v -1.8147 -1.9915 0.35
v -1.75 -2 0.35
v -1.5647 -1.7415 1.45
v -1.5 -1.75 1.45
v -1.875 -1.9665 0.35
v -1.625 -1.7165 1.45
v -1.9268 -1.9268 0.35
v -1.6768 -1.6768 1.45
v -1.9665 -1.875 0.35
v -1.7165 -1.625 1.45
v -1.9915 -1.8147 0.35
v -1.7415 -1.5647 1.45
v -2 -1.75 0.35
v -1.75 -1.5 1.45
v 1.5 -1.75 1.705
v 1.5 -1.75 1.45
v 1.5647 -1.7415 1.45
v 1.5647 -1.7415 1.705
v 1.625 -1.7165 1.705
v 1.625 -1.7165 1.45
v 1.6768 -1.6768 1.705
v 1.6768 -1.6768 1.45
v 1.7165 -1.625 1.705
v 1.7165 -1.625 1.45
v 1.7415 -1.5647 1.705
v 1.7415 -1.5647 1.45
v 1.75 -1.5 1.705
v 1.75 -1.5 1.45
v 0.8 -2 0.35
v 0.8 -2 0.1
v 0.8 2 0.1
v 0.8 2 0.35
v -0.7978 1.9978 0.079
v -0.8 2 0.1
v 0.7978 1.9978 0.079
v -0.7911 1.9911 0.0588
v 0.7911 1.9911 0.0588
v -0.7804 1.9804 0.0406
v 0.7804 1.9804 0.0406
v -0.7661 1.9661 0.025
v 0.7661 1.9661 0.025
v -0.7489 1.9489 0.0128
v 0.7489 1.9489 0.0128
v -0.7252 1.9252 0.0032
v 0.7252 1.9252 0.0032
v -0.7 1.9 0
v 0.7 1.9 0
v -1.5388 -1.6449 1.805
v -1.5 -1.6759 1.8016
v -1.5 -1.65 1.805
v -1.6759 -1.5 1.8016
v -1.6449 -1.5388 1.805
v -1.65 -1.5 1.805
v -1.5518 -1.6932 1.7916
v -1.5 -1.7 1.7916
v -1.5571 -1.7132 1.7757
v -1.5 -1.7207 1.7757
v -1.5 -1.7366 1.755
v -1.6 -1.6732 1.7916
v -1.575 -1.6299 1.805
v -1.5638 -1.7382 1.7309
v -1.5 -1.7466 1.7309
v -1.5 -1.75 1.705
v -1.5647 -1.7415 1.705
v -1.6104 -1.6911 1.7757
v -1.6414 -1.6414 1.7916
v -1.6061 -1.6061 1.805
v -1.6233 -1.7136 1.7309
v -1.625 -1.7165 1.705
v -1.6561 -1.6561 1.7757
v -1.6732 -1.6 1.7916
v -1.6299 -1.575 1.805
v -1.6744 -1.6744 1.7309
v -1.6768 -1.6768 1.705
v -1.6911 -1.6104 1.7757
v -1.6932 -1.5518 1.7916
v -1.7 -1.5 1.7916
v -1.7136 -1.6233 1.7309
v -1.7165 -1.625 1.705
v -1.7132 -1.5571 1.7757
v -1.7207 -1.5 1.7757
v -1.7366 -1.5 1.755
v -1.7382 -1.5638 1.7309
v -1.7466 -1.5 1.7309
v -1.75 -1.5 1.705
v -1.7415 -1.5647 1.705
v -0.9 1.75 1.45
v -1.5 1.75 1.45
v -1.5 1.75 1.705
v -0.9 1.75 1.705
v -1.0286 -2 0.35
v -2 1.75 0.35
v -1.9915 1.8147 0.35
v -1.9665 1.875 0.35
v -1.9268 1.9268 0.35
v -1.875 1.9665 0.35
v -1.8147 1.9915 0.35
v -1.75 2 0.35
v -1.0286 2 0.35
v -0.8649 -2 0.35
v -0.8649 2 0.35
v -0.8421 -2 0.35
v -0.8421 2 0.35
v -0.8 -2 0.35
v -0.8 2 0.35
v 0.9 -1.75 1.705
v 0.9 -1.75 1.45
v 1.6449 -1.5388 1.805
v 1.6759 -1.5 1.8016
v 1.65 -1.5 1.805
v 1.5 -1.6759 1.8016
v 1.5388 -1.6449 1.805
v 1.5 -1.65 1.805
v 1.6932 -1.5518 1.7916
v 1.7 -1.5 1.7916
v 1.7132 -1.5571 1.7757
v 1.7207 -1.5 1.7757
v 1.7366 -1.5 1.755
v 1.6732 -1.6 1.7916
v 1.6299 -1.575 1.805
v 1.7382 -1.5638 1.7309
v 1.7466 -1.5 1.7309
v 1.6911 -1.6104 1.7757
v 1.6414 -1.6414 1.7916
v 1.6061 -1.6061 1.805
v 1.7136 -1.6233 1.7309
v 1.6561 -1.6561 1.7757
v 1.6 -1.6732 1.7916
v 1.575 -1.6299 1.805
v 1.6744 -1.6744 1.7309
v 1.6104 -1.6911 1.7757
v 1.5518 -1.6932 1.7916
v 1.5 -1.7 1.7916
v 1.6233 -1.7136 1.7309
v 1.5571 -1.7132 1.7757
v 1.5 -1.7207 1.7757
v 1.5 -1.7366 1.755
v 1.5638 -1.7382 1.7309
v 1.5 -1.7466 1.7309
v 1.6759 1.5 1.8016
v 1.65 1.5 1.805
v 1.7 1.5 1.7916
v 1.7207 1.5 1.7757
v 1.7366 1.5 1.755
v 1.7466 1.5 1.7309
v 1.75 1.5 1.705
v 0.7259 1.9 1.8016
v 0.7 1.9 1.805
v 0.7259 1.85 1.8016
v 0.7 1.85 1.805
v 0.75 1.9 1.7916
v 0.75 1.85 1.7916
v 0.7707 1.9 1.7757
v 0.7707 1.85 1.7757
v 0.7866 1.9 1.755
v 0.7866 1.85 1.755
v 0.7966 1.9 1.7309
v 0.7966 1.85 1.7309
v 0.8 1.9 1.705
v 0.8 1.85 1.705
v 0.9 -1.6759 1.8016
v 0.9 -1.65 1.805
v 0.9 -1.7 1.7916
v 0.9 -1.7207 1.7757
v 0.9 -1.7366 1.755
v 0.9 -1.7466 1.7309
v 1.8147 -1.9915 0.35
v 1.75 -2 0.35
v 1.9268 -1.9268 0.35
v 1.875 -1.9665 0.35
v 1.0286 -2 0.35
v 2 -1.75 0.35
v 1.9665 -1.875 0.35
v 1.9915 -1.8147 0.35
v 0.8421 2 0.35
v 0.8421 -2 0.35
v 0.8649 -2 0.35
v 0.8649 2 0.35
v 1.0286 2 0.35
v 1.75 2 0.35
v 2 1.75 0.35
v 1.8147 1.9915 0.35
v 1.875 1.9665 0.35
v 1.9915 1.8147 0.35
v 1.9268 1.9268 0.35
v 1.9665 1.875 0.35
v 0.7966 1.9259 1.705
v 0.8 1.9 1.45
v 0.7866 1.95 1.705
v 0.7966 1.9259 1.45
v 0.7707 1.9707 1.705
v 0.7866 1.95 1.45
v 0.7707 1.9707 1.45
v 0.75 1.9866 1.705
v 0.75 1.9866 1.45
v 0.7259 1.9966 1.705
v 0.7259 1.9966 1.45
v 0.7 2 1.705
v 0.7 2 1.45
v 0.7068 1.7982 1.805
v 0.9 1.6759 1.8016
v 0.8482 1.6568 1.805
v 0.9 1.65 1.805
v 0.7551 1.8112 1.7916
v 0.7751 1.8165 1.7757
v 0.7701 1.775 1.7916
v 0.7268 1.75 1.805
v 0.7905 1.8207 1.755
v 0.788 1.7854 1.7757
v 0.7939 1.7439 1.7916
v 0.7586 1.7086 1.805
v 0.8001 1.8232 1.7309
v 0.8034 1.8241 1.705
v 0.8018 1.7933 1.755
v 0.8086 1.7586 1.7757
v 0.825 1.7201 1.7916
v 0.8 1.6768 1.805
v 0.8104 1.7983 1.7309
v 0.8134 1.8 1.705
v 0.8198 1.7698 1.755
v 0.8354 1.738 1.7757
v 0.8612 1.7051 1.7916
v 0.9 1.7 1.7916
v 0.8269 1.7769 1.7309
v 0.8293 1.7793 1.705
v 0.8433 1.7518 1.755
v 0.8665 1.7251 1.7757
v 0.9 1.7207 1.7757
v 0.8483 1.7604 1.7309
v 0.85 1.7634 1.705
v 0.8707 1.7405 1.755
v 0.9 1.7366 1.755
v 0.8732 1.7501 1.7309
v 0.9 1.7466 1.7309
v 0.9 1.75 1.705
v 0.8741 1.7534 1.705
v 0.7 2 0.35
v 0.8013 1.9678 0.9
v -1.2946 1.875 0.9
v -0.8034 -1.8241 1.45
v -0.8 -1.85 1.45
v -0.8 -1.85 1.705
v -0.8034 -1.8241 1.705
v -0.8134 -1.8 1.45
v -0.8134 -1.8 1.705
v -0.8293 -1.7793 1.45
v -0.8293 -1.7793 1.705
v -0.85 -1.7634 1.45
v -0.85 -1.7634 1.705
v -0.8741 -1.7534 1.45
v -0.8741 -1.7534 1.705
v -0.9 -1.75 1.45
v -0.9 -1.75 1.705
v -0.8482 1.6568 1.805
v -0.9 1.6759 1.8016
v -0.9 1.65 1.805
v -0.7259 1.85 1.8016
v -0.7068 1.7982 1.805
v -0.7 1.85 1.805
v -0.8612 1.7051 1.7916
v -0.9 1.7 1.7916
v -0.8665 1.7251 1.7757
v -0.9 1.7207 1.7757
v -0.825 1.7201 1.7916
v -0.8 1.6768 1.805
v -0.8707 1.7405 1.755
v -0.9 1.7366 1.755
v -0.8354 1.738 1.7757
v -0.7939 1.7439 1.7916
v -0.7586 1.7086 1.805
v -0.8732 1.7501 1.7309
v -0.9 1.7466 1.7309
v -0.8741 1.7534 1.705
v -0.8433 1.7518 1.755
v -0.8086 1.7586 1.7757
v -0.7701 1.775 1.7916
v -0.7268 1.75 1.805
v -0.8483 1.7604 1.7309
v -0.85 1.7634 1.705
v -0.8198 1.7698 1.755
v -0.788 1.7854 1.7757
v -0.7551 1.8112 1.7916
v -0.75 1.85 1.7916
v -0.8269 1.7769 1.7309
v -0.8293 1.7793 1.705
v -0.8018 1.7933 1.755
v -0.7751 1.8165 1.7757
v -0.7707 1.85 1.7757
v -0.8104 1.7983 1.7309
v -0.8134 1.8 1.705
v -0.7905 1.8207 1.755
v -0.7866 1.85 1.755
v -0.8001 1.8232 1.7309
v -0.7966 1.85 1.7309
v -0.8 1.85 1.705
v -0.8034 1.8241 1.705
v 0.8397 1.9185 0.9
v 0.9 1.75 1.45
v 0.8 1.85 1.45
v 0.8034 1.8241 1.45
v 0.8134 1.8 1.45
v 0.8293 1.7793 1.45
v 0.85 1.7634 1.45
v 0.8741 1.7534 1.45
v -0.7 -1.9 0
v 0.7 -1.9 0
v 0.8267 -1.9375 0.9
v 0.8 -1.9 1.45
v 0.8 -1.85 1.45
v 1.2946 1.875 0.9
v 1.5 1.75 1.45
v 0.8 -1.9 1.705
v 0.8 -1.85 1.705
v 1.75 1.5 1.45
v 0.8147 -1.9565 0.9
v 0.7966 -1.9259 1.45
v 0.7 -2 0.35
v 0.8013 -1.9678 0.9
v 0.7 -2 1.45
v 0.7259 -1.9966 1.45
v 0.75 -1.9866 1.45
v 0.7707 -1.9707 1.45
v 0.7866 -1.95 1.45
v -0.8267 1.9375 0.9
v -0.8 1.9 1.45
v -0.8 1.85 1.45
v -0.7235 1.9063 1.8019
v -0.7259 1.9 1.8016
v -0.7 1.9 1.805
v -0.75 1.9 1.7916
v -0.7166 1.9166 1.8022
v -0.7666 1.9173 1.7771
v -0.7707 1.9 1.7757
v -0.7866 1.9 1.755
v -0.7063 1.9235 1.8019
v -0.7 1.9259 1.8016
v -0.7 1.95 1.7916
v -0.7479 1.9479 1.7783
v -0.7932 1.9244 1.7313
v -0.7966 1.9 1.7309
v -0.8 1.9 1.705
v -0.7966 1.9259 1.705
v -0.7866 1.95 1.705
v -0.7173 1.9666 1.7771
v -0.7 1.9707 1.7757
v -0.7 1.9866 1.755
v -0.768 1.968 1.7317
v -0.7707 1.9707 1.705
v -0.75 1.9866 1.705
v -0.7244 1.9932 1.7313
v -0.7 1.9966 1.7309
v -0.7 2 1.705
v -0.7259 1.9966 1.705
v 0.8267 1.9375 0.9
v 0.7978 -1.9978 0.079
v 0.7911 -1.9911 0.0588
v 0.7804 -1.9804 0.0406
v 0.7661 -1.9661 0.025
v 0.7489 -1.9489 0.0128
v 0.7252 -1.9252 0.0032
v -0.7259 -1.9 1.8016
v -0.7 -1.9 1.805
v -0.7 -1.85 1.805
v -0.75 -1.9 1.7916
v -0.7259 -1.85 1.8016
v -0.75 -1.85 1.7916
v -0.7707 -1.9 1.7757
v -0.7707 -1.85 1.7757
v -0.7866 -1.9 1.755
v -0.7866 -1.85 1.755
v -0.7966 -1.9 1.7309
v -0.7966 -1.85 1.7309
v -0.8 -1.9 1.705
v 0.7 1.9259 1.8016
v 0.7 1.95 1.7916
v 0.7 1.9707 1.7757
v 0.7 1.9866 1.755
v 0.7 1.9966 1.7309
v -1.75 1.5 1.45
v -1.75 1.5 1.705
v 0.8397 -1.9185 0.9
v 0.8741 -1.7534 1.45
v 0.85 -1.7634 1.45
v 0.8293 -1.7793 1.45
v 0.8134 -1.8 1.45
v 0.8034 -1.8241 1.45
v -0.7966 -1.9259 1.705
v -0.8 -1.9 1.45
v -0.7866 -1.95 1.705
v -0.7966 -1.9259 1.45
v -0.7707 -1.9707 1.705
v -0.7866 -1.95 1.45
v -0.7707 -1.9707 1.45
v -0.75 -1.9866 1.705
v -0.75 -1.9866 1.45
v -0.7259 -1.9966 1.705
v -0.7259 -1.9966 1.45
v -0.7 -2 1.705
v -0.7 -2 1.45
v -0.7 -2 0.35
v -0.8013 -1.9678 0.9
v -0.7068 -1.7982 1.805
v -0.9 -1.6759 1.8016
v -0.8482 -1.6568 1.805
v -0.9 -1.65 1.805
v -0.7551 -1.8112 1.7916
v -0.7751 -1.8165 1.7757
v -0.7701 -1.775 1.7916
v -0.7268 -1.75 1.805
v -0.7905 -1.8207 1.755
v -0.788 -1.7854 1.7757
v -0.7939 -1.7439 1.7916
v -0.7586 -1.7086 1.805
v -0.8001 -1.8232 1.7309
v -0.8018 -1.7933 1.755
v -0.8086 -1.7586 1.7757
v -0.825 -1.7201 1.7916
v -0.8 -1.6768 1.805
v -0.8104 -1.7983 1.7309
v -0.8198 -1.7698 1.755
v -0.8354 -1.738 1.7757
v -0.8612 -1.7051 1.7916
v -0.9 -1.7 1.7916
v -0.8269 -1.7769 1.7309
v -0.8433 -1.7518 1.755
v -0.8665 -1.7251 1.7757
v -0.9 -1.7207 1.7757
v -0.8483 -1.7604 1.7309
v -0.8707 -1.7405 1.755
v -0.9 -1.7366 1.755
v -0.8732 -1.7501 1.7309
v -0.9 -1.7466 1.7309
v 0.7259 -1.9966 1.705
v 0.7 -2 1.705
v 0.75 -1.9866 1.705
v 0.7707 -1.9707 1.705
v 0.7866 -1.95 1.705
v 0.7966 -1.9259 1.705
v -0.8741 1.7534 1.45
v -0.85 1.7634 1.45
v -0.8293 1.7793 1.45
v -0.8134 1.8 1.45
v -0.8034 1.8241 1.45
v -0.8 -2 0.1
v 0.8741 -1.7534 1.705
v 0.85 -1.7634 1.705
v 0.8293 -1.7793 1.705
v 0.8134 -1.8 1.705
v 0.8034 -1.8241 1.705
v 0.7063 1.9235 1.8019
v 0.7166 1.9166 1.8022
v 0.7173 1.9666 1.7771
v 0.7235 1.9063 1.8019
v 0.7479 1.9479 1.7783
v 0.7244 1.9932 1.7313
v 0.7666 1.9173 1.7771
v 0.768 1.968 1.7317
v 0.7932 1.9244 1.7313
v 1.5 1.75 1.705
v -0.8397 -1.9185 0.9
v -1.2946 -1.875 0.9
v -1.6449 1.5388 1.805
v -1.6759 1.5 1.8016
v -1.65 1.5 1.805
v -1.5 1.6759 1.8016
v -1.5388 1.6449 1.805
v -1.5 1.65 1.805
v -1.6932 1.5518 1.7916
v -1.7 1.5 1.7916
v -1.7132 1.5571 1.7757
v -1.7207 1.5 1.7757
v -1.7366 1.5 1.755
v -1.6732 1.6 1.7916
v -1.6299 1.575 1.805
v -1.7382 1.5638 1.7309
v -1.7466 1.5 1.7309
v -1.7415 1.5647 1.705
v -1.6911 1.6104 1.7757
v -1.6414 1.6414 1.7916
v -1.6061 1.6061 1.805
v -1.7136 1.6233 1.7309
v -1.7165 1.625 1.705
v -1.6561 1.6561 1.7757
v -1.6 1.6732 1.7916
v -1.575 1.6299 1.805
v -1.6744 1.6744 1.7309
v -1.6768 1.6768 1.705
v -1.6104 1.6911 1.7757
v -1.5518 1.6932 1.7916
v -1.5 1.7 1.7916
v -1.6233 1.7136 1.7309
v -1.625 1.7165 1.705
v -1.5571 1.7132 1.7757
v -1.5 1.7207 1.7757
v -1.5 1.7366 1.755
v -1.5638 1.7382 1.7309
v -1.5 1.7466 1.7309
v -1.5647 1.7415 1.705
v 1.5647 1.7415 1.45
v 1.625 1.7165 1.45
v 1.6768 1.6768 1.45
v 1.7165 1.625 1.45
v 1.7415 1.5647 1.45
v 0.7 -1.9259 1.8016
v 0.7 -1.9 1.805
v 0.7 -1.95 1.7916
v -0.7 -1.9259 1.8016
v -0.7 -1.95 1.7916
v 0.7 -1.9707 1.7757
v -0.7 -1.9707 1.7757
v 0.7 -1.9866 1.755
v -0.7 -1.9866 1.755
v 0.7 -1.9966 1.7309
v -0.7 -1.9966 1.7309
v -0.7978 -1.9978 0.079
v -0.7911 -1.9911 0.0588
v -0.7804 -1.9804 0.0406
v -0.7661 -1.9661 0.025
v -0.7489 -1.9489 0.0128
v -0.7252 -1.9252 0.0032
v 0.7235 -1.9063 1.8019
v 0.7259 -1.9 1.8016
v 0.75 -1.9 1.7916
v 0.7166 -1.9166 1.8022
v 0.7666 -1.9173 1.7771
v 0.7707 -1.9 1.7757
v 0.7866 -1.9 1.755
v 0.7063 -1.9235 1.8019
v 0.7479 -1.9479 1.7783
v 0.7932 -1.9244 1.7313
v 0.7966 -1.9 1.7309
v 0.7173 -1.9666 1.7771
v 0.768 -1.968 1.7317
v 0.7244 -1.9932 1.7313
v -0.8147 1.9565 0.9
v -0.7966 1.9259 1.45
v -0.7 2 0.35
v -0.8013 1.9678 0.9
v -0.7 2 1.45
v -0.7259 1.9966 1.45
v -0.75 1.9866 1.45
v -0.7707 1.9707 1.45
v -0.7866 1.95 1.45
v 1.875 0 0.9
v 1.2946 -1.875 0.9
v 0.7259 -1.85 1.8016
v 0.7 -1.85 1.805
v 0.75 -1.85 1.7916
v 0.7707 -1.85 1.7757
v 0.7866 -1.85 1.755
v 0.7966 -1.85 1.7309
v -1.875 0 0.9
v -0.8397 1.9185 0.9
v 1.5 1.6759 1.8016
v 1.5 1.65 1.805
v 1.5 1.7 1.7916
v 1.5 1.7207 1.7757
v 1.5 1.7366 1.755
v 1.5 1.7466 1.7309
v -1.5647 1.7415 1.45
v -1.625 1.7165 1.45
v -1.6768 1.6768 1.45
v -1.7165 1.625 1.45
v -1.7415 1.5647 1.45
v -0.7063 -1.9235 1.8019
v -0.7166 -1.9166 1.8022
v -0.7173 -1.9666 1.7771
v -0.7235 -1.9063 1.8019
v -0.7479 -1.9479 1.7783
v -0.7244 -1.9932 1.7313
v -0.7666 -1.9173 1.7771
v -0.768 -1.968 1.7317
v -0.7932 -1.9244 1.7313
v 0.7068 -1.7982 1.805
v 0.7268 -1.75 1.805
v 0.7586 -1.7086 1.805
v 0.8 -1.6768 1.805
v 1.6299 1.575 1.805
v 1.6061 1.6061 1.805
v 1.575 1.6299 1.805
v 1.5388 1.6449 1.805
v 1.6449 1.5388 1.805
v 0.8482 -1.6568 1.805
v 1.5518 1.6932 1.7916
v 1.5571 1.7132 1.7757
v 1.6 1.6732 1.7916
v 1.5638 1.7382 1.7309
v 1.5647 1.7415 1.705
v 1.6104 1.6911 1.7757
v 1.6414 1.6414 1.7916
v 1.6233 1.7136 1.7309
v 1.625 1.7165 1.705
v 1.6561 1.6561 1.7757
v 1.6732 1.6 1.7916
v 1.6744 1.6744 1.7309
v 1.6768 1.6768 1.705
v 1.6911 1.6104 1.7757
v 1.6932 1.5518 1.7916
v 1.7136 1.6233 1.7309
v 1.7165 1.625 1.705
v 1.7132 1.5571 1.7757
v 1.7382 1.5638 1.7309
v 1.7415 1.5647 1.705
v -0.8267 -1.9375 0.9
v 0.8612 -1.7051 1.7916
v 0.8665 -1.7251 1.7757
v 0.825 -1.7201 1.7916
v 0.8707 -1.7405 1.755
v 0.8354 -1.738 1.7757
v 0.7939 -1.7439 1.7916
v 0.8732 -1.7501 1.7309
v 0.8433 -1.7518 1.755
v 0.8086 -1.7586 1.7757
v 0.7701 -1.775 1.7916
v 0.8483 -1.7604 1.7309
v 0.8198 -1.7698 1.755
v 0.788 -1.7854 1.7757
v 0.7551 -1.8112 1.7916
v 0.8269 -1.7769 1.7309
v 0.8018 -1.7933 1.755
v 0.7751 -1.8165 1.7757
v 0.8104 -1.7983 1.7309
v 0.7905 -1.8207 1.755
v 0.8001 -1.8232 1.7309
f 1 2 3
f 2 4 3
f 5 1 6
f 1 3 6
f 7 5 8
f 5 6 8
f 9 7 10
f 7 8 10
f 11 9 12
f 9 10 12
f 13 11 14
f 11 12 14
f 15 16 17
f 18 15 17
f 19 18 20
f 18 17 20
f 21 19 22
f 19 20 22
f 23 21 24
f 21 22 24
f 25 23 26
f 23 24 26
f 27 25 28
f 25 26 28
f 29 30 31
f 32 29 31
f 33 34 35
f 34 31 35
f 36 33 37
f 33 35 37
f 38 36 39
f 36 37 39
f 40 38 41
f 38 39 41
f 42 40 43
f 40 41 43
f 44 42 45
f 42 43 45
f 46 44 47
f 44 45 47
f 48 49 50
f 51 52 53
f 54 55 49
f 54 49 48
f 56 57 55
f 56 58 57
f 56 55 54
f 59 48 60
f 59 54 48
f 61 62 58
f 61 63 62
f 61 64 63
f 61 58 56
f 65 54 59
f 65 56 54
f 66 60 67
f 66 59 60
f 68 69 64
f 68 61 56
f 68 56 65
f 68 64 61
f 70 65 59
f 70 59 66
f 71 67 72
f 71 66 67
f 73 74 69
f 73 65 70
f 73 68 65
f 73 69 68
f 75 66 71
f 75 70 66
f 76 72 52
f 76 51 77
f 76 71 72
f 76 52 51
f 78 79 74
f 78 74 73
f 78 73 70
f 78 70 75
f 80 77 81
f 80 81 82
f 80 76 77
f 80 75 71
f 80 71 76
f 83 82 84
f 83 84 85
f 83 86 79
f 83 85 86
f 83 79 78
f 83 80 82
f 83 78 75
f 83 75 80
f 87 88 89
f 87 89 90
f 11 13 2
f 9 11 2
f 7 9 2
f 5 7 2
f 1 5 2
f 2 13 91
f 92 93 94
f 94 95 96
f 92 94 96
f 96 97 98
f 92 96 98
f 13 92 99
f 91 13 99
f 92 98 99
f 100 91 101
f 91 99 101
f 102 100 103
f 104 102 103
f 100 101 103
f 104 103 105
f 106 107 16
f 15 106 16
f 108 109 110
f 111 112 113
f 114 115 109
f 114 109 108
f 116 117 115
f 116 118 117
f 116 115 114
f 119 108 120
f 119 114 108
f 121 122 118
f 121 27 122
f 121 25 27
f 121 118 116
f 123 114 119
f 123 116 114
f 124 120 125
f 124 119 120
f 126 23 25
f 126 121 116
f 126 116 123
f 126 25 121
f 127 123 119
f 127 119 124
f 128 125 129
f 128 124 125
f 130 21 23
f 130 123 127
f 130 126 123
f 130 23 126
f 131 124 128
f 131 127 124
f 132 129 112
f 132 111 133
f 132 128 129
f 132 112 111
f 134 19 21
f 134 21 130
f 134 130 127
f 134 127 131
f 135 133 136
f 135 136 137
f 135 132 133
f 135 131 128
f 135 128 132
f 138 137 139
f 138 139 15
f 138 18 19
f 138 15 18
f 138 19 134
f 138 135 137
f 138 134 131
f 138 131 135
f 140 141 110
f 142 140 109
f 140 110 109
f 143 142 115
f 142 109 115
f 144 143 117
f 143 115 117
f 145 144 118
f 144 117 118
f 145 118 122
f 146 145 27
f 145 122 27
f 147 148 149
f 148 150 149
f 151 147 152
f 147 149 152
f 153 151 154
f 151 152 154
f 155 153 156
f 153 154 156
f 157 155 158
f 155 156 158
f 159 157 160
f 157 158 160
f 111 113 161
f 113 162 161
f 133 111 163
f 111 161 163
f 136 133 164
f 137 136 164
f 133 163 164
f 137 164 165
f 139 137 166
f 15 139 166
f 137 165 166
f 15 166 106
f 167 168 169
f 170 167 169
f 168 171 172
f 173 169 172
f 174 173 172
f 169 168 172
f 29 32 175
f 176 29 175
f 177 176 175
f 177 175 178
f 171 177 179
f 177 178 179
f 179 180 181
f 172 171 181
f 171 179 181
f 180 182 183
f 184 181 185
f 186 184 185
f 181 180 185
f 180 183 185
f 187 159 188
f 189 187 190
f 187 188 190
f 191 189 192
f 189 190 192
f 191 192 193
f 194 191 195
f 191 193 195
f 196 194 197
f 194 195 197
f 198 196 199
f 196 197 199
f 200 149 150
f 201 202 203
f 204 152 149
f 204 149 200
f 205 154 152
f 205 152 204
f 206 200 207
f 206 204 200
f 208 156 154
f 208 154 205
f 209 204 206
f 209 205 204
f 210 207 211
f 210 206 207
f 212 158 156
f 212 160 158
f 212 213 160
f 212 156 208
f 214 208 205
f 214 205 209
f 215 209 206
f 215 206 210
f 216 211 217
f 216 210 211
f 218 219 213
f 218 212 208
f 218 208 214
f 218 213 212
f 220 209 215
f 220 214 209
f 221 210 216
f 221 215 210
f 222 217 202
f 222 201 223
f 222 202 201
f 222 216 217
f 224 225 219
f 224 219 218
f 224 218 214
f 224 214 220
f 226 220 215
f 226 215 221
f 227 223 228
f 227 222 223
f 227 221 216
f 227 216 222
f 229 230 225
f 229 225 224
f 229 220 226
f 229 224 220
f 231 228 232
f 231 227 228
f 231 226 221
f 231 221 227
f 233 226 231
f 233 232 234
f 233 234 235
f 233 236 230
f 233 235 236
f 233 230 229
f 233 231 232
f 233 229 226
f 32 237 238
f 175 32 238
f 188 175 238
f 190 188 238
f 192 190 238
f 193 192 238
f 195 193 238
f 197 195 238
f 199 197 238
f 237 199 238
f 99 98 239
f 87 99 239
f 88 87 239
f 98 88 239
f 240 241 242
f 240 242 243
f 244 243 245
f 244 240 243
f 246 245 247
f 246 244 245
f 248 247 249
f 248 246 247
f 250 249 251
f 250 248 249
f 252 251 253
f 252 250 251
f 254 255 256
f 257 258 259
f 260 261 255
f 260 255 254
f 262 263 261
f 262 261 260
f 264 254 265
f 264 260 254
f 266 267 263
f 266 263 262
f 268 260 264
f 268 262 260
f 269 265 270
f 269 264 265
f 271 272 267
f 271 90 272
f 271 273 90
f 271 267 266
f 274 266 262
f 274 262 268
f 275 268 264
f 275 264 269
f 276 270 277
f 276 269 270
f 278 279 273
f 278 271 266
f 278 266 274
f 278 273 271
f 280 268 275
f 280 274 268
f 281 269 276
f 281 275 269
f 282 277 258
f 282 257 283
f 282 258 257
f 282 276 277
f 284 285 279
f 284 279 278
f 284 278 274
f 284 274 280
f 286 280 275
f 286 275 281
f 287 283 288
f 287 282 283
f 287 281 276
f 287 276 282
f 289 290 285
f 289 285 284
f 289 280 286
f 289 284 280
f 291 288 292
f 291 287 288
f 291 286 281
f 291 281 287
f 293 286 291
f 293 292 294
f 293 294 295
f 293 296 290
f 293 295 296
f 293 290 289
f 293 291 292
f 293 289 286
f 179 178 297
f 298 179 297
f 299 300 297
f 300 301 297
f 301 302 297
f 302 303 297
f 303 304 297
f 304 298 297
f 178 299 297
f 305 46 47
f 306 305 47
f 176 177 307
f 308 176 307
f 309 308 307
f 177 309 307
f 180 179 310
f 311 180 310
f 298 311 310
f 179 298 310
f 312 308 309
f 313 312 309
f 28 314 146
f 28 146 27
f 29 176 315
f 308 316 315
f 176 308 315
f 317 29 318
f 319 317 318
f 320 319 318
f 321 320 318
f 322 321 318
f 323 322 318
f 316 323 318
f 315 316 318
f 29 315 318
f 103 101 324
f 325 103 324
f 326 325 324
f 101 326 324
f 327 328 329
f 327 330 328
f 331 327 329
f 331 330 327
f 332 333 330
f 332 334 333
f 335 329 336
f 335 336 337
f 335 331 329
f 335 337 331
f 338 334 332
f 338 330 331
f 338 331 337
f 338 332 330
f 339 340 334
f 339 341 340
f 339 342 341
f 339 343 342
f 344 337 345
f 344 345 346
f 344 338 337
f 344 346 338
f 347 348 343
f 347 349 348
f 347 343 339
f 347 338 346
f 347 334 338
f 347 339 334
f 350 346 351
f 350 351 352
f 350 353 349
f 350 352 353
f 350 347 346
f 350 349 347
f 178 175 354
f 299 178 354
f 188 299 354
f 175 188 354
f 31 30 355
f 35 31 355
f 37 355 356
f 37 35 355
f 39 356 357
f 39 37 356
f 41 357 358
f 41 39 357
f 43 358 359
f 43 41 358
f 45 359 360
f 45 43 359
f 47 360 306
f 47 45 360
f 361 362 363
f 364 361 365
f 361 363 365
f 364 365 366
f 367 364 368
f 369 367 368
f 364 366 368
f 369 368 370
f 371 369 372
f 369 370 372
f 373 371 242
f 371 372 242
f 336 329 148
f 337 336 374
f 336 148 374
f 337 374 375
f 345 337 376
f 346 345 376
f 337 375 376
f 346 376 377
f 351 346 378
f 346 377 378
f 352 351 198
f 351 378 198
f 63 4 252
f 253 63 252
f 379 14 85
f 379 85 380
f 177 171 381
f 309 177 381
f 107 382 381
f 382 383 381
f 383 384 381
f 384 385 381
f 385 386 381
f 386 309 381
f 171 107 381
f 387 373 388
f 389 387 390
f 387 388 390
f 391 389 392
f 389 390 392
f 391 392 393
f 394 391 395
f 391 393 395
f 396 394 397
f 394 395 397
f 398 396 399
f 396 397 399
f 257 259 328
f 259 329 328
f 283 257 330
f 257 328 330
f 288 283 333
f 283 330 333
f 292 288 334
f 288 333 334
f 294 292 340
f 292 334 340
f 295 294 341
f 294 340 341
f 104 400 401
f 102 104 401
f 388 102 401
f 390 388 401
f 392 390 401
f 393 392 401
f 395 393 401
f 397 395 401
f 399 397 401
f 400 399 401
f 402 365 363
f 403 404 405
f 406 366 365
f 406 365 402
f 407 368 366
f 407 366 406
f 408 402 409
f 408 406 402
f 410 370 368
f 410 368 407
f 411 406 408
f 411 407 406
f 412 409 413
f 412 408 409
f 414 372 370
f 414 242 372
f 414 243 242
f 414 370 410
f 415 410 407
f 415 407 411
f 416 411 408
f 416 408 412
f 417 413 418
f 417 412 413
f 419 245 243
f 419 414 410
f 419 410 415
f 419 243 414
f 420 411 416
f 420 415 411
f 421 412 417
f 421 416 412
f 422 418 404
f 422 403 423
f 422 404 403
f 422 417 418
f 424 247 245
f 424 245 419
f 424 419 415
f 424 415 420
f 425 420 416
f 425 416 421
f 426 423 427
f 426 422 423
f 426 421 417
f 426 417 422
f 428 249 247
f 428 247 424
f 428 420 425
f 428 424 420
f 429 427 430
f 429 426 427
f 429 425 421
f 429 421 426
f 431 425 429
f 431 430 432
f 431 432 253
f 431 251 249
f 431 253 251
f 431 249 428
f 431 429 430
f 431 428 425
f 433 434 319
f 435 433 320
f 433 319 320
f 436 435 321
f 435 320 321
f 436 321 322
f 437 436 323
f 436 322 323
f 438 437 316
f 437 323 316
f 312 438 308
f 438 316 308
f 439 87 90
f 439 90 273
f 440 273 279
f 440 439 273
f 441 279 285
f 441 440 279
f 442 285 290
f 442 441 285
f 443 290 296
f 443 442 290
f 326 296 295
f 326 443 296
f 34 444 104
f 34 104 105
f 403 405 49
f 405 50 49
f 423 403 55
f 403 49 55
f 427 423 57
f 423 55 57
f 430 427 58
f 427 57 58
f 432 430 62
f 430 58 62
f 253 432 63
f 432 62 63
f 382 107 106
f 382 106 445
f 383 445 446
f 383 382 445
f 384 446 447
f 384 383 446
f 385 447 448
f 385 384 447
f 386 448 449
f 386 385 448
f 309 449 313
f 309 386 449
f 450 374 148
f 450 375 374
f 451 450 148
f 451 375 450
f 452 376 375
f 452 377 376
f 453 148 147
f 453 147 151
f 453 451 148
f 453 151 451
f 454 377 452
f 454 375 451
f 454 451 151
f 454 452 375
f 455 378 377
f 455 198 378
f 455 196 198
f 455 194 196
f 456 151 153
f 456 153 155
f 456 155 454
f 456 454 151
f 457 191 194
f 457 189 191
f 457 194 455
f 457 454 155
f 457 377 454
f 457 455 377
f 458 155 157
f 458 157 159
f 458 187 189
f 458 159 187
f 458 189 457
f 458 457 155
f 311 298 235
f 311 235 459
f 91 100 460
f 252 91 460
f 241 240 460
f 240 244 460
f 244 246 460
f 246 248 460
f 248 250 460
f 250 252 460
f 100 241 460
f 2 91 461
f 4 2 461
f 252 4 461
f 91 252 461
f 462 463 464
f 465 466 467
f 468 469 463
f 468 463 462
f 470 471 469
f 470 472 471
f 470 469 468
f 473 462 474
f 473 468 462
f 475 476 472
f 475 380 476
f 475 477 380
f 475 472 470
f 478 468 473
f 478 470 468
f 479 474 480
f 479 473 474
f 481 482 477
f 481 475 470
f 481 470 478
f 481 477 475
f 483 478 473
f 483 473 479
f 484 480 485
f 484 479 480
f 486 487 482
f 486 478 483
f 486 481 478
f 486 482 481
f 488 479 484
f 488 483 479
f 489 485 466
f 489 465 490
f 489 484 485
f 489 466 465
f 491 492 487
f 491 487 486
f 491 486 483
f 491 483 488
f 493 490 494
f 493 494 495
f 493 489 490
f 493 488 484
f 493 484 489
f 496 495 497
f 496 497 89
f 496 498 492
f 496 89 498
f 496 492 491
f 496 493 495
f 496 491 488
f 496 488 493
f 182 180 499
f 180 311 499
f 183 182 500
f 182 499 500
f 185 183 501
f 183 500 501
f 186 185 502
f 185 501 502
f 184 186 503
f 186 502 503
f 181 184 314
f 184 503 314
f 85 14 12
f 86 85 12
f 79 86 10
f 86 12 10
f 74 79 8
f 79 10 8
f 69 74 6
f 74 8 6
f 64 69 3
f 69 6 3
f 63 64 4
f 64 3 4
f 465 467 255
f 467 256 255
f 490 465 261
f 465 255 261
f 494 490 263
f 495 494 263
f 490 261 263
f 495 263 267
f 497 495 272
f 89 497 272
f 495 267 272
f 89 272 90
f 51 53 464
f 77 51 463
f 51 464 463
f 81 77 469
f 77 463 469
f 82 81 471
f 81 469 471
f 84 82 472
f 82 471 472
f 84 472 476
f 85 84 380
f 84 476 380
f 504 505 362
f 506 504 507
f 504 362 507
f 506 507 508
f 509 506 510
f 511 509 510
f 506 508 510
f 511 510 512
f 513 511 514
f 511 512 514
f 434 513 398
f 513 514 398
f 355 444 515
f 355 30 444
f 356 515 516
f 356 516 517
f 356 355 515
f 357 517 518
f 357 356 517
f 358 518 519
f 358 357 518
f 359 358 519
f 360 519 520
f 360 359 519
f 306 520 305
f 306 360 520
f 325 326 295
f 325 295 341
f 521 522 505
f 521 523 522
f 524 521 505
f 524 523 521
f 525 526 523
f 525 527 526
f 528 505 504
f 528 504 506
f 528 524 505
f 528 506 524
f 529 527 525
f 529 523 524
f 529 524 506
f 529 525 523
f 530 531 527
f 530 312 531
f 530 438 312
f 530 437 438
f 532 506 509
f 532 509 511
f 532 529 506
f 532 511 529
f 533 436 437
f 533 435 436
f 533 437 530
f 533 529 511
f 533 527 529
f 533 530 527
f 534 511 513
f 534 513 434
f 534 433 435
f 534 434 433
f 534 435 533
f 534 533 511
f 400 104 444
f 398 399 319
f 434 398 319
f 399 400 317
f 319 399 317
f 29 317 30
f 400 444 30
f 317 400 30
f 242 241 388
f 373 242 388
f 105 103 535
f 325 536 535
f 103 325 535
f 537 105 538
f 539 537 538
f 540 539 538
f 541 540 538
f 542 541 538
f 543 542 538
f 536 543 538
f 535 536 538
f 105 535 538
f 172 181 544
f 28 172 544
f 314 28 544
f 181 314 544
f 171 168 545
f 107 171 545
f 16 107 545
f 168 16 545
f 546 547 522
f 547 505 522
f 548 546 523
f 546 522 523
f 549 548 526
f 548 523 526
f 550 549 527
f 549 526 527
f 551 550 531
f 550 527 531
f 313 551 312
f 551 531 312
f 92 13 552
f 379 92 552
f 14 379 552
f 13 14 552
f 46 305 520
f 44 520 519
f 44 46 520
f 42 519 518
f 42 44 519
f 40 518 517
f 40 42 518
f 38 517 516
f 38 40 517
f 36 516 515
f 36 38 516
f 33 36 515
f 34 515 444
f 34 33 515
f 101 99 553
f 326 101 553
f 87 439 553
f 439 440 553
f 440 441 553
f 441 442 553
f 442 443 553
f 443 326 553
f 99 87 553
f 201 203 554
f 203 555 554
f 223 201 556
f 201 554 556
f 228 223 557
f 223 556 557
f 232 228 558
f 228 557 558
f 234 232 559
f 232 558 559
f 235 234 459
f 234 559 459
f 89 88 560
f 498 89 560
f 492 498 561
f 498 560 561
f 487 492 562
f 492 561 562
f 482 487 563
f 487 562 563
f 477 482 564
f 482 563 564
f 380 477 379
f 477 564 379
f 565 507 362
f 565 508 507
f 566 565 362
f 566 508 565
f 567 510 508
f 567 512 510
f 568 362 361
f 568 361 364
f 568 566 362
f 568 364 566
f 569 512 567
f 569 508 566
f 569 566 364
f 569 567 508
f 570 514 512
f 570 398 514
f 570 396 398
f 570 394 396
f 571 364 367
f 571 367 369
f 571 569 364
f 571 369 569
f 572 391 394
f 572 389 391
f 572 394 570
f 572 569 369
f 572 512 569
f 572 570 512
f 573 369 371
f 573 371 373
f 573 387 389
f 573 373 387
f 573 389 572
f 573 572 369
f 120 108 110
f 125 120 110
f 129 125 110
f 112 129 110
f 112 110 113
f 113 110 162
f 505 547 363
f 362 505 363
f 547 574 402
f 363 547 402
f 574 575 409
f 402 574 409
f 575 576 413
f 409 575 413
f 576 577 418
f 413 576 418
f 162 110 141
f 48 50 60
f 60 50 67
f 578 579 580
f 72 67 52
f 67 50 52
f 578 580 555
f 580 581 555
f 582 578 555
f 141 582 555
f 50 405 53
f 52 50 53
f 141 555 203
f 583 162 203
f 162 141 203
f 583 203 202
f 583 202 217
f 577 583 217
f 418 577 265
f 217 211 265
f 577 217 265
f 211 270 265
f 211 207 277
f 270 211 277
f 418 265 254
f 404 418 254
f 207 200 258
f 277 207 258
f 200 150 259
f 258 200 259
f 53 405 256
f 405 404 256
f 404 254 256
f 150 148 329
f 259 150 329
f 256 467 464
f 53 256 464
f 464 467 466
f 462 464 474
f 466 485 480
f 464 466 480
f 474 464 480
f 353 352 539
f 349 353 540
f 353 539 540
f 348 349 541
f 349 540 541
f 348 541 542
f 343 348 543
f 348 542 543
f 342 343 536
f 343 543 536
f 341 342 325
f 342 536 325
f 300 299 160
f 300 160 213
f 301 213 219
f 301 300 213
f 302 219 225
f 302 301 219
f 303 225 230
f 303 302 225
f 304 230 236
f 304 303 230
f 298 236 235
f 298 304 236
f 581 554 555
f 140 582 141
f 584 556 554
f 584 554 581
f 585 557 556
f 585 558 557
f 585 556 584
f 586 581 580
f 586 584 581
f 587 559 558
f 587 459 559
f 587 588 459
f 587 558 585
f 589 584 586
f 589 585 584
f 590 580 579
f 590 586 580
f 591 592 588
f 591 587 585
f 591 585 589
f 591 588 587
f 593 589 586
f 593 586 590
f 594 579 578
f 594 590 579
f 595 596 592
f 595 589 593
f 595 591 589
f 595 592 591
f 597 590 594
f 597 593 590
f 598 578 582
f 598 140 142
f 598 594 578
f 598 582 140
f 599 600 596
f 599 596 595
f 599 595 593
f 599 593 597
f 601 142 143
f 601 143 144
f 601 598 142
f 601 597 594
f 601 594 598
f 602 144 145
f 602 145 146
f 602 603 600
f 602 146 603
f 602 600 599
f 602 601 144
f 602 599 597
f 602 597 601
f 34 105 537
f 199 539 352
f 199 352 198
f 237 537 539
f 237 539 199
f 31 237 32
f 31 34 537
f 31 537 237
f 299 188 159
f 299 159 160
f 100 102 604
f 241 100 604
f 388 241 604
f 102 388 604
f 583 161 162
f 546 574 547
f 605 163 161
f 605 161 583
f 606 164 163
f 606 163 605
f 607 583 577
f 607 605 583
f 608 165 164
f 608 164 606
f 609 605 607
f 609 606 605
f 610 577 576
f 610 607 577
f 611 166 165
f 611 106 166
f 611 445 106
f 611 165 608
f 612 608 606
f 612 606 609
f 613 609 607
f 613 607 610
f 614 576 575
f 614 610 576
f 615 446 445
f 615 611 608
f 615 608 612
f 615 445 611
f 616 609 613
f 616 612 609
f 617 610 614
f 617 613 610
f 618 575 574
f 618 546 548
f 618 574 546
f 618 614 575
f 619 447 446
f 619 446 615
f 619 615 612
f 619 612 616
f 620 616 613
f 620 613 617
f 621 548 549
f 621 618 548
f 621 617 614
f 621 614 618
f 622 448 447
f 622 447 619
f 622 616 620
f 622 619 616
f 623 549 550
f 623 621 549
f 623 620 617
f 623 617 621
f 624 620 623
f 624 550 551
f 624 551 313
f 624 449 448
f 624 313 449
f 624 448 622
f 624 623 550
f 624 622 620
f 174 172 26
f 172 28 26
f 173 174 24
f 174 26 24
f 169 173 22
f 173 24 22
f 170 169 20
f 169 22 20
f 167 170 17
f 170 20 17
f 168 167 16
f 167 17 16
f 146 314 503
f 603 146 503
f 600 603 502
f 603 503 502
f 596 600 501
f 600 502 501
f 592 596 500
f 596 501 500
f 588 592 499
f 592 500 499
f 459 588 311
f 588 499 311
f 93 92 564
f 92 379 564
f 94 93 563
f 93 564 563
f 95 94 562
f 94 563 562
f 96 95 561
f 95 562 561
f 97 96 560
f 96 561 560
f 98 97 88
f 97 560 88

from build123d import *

# Parameters (mm, degrees)
SKETCH003_W  = 1.6
SKETCH003_H  = 4
PAD002_DEPTH = 0.35
PAD003_DEPTH = 0.355
FILLET002_R  = 0.1
FILLET003_R  = 0.1


with BuildPart() as part:
    # Sketch003 → Pad002 (new body)
    with BuildSketch(Plane.XY):
        Rectangle(SKETCH003_W, SKETCH003_H)
    extrude(amount=PAD002_DEPTH)

    # Sketch004 (on Face6 of Pad002) → AdditiveLoft section 0
    with BuildSketch(Plane.XY.offset(0.35)):
        with BuildLine():
            Line((-1.75, 2), (1.75, 2))
            ThreePointArc((2, 1.75), (1.926777, 1.926777), (1.75, 2))
            Line((2, 1.75), (2, -1.75))
            ThreePointArc((1.75, -2), (1.926777, -1.926777), (2, -1.75))
            Line((1.75, -2), (-1.75, -2))
            ThreePointArc((-2, -1.75), (-1.926777, -1.926777), (-1.75, -2))
            Line((-2, -1.75), (-2, 1.75))
            ThreePointArc((-1.75, 2), (-1.926777, 1.926777), (-2, 1.75))
        make_face()
    # Sketch005 (on Face6 of Pad002) → AdditiveLoft section 1
    with BuildSketch(Plane.XY.offset(1.45)):
        with BuildLine():
            Line((1.75, 1.5), (1.75, -1.5))
            ThreePointArc((1.5, -1.75), (1.676777, -1.676777), (1.75, -1.5))
            Line((0.9, -1.75), (1.5, -1.75))
            ThreePointArc((0.9, -1.75), (0.829289, -1.779289), (0.8, -1.85))
            Line((0.8, -1.9), (0.8, -1.85))
            ThreePointArc((0.7, -2), (0.770711, -1.970711), (0.8, -1.9))
            Line((-0.7, -2), (0.7, -2))
            ThreePointArc((-0.8, -1.9), (-0.770711, -1.970711), (-0.7, -2))
            Line((-0.8, -1.85), (-0.8, -1.9))
            ThreePointArc((-0.8, -1.85), (-0.829289, -1.779289), (-0.9, -1.75))
            Line((-1.5, -1.75), (-0.9, -1.75))
            ThreePointArc((-1.75, -1.5), (-1.676777, -1.676777), (-1.5, -1.75))
            Line((-1.75, -1.5), (-1.75, 1.5))
            ThreePointArc((-1.5, 1.75), (-1.676777, 1.676777), (-1.75, 1.5))
            Line((-1.5, 1.75), (-0.9, 1.75))
            ThreePointArc((-0.9, 1.75), (-0.829289, 1.779289), (-0.8, 1.85))
            Line((-0.8, 1.85), (-0.8, 1.9))
            ThreePointArc((-0.7, 2), (-0.770711, 1.970711), (-0.8, 1.9))
            Line((-0.7, 2), (0.7, 2))
            ThreePointArc((0.8, 1.9), (0.770711, 1.970711), (0.7, 2))
            Line((0.8, 1.9), (0.8, 1.85))
            ThreePointArc((0.8, 1.85), (0.829289, 1.779289), (0.9, 1.75))
            Line((0.9, 1.75), (1.5, 1.75))
            ThreePointArc((1.75, 1.5), (1.676777, 1.676777), (1.5, 1.75))
        make_face()
    loft()

    # Sketch005 (on Face6 of Pad002) → Pad003 (join)
    with BuildSketch(Plane.XY.offset(1.45)):
        with BuildLine():
            Line((1.75, 1.5), (1.75, -1.5))
            ThreePointArc((1.5, -1.75), (1.676777, -1.676777), (1.75, -1.5))
            Line((0.9, -1.75), (1.5, -1.75))
            ThreePointArc((0.9, -1.75), (0.829289, -1.779289), (0.8, -1.85))
            Line((0.8, -1.9), (0.8, -1.85))
            ThreePointArc((0.7, -2), (0.770711, -1.970711), (0.8, -1.9))
            Line((-0.7, -2), (0.7, -2))
            ThreePointArc((-0.8, -1.9), (-0.770711, -1.970711), (-0.7, -2))
            Line((-0.8, -1.85), (-0.8, -1.9))
            ThreePointArc((-0.8, -1.85), (-0.829289, -1.779289), (-0.9, -1.75))
            Line((-1.5, -1.75), (-0.9, -1.75))
            ThreePointArc((-1.75, -1.5), (-1.676777, -1.676777), (-1.5, -1.75))
            Line((-1.75, -1.5), (-1.75, 1.5))
            ThreePointArc((-1.5, 1.75), (-1.676777, 1.676777), (-1.75, 1.5))
            Line((-1.5, 1.75), (-0.9, 1.75))
            ThreePointArc((-0.9, 1.75), (-0.829289, 1.779289), (-0.8, 1.85))
            Line((-0.8, 1.85), (-0.8, 1.9))
            ThreePointArc((-0.7, 2), (-0.770711, 1.970711), (-0.8, 1.9))
            Line((-0.7, 2), (0.7, 2))
            ThreePointArc((0.8, 1.9), (0.770711, 1.970711), (0.7, 2))
            Line((0.8, 1.9), (0.8, 1.85))
            ThreePointArc((0.8, 1.85), (0.829289, 1.779289), (0.9, 1.75))
            Line((0.9, 1.75), (1.5, 1.75))
            ThreePointArc((1.75, 1.5), (1.676777, 1.676777), (1.5, 1.75))
        make_face()
    extrude(amount=PAD003_DEPTH)

    # Fillet002
    fillet002_edges = [part.edges().sort_by_distance(p)[0] for p in [
        (0, 2, 0),
        (0.8, 0, 0),
        (0, -2, 0),
        (-0.8, 0, 0),
    ]]
    fillet(fillet002_edges, radius=FILLET002_R)

    # Fillet003
    fillet003_edges = [part.edges().sort_by_distance(p)[0] for p in [
        (0.8, 1.875, 1.805),
        (0.829289, 1.779289, 1.805),
        (1.2, 1.75, 1.805),
        (1.676777, 1.676777, 1.805),
        (1.75, 0, 1.805),
        (1.676777, -1.676777, 1.805),
        (1.2, -1.75, 1.805),
        (0.829289, -1.779289, 1.805),
        (0.8, -1.875, 1.805),
        (0.770711, -1.970711, 1.805),
        (0, -2, 1.805),
        (-0.770711, -1.970711, 1.805),
        (-0.8, -1.875, 1.805),
        (-0.829289, -1.779289, 1.805),
        (-1.2, -1.75, 1.805),
        (-1.676777, -1.676777, 1.805),
        (-1.75, 0, 1.805),
        (-1.676777, 1.676777, 1.805),
        (-1.2, 1.75, 1.805),
        (-0.829289, 1.779289, 1.805),
        (-0.8, 1.875, 1.805),
        (-0.770711, 1.970711, 1.805),
        (0, 2, 1.805),
        (0.770711, 1.970711, 1.805),
    ]]
    fillet(fillet003_edges, radius=FILLET003_R)


solid = part.part
